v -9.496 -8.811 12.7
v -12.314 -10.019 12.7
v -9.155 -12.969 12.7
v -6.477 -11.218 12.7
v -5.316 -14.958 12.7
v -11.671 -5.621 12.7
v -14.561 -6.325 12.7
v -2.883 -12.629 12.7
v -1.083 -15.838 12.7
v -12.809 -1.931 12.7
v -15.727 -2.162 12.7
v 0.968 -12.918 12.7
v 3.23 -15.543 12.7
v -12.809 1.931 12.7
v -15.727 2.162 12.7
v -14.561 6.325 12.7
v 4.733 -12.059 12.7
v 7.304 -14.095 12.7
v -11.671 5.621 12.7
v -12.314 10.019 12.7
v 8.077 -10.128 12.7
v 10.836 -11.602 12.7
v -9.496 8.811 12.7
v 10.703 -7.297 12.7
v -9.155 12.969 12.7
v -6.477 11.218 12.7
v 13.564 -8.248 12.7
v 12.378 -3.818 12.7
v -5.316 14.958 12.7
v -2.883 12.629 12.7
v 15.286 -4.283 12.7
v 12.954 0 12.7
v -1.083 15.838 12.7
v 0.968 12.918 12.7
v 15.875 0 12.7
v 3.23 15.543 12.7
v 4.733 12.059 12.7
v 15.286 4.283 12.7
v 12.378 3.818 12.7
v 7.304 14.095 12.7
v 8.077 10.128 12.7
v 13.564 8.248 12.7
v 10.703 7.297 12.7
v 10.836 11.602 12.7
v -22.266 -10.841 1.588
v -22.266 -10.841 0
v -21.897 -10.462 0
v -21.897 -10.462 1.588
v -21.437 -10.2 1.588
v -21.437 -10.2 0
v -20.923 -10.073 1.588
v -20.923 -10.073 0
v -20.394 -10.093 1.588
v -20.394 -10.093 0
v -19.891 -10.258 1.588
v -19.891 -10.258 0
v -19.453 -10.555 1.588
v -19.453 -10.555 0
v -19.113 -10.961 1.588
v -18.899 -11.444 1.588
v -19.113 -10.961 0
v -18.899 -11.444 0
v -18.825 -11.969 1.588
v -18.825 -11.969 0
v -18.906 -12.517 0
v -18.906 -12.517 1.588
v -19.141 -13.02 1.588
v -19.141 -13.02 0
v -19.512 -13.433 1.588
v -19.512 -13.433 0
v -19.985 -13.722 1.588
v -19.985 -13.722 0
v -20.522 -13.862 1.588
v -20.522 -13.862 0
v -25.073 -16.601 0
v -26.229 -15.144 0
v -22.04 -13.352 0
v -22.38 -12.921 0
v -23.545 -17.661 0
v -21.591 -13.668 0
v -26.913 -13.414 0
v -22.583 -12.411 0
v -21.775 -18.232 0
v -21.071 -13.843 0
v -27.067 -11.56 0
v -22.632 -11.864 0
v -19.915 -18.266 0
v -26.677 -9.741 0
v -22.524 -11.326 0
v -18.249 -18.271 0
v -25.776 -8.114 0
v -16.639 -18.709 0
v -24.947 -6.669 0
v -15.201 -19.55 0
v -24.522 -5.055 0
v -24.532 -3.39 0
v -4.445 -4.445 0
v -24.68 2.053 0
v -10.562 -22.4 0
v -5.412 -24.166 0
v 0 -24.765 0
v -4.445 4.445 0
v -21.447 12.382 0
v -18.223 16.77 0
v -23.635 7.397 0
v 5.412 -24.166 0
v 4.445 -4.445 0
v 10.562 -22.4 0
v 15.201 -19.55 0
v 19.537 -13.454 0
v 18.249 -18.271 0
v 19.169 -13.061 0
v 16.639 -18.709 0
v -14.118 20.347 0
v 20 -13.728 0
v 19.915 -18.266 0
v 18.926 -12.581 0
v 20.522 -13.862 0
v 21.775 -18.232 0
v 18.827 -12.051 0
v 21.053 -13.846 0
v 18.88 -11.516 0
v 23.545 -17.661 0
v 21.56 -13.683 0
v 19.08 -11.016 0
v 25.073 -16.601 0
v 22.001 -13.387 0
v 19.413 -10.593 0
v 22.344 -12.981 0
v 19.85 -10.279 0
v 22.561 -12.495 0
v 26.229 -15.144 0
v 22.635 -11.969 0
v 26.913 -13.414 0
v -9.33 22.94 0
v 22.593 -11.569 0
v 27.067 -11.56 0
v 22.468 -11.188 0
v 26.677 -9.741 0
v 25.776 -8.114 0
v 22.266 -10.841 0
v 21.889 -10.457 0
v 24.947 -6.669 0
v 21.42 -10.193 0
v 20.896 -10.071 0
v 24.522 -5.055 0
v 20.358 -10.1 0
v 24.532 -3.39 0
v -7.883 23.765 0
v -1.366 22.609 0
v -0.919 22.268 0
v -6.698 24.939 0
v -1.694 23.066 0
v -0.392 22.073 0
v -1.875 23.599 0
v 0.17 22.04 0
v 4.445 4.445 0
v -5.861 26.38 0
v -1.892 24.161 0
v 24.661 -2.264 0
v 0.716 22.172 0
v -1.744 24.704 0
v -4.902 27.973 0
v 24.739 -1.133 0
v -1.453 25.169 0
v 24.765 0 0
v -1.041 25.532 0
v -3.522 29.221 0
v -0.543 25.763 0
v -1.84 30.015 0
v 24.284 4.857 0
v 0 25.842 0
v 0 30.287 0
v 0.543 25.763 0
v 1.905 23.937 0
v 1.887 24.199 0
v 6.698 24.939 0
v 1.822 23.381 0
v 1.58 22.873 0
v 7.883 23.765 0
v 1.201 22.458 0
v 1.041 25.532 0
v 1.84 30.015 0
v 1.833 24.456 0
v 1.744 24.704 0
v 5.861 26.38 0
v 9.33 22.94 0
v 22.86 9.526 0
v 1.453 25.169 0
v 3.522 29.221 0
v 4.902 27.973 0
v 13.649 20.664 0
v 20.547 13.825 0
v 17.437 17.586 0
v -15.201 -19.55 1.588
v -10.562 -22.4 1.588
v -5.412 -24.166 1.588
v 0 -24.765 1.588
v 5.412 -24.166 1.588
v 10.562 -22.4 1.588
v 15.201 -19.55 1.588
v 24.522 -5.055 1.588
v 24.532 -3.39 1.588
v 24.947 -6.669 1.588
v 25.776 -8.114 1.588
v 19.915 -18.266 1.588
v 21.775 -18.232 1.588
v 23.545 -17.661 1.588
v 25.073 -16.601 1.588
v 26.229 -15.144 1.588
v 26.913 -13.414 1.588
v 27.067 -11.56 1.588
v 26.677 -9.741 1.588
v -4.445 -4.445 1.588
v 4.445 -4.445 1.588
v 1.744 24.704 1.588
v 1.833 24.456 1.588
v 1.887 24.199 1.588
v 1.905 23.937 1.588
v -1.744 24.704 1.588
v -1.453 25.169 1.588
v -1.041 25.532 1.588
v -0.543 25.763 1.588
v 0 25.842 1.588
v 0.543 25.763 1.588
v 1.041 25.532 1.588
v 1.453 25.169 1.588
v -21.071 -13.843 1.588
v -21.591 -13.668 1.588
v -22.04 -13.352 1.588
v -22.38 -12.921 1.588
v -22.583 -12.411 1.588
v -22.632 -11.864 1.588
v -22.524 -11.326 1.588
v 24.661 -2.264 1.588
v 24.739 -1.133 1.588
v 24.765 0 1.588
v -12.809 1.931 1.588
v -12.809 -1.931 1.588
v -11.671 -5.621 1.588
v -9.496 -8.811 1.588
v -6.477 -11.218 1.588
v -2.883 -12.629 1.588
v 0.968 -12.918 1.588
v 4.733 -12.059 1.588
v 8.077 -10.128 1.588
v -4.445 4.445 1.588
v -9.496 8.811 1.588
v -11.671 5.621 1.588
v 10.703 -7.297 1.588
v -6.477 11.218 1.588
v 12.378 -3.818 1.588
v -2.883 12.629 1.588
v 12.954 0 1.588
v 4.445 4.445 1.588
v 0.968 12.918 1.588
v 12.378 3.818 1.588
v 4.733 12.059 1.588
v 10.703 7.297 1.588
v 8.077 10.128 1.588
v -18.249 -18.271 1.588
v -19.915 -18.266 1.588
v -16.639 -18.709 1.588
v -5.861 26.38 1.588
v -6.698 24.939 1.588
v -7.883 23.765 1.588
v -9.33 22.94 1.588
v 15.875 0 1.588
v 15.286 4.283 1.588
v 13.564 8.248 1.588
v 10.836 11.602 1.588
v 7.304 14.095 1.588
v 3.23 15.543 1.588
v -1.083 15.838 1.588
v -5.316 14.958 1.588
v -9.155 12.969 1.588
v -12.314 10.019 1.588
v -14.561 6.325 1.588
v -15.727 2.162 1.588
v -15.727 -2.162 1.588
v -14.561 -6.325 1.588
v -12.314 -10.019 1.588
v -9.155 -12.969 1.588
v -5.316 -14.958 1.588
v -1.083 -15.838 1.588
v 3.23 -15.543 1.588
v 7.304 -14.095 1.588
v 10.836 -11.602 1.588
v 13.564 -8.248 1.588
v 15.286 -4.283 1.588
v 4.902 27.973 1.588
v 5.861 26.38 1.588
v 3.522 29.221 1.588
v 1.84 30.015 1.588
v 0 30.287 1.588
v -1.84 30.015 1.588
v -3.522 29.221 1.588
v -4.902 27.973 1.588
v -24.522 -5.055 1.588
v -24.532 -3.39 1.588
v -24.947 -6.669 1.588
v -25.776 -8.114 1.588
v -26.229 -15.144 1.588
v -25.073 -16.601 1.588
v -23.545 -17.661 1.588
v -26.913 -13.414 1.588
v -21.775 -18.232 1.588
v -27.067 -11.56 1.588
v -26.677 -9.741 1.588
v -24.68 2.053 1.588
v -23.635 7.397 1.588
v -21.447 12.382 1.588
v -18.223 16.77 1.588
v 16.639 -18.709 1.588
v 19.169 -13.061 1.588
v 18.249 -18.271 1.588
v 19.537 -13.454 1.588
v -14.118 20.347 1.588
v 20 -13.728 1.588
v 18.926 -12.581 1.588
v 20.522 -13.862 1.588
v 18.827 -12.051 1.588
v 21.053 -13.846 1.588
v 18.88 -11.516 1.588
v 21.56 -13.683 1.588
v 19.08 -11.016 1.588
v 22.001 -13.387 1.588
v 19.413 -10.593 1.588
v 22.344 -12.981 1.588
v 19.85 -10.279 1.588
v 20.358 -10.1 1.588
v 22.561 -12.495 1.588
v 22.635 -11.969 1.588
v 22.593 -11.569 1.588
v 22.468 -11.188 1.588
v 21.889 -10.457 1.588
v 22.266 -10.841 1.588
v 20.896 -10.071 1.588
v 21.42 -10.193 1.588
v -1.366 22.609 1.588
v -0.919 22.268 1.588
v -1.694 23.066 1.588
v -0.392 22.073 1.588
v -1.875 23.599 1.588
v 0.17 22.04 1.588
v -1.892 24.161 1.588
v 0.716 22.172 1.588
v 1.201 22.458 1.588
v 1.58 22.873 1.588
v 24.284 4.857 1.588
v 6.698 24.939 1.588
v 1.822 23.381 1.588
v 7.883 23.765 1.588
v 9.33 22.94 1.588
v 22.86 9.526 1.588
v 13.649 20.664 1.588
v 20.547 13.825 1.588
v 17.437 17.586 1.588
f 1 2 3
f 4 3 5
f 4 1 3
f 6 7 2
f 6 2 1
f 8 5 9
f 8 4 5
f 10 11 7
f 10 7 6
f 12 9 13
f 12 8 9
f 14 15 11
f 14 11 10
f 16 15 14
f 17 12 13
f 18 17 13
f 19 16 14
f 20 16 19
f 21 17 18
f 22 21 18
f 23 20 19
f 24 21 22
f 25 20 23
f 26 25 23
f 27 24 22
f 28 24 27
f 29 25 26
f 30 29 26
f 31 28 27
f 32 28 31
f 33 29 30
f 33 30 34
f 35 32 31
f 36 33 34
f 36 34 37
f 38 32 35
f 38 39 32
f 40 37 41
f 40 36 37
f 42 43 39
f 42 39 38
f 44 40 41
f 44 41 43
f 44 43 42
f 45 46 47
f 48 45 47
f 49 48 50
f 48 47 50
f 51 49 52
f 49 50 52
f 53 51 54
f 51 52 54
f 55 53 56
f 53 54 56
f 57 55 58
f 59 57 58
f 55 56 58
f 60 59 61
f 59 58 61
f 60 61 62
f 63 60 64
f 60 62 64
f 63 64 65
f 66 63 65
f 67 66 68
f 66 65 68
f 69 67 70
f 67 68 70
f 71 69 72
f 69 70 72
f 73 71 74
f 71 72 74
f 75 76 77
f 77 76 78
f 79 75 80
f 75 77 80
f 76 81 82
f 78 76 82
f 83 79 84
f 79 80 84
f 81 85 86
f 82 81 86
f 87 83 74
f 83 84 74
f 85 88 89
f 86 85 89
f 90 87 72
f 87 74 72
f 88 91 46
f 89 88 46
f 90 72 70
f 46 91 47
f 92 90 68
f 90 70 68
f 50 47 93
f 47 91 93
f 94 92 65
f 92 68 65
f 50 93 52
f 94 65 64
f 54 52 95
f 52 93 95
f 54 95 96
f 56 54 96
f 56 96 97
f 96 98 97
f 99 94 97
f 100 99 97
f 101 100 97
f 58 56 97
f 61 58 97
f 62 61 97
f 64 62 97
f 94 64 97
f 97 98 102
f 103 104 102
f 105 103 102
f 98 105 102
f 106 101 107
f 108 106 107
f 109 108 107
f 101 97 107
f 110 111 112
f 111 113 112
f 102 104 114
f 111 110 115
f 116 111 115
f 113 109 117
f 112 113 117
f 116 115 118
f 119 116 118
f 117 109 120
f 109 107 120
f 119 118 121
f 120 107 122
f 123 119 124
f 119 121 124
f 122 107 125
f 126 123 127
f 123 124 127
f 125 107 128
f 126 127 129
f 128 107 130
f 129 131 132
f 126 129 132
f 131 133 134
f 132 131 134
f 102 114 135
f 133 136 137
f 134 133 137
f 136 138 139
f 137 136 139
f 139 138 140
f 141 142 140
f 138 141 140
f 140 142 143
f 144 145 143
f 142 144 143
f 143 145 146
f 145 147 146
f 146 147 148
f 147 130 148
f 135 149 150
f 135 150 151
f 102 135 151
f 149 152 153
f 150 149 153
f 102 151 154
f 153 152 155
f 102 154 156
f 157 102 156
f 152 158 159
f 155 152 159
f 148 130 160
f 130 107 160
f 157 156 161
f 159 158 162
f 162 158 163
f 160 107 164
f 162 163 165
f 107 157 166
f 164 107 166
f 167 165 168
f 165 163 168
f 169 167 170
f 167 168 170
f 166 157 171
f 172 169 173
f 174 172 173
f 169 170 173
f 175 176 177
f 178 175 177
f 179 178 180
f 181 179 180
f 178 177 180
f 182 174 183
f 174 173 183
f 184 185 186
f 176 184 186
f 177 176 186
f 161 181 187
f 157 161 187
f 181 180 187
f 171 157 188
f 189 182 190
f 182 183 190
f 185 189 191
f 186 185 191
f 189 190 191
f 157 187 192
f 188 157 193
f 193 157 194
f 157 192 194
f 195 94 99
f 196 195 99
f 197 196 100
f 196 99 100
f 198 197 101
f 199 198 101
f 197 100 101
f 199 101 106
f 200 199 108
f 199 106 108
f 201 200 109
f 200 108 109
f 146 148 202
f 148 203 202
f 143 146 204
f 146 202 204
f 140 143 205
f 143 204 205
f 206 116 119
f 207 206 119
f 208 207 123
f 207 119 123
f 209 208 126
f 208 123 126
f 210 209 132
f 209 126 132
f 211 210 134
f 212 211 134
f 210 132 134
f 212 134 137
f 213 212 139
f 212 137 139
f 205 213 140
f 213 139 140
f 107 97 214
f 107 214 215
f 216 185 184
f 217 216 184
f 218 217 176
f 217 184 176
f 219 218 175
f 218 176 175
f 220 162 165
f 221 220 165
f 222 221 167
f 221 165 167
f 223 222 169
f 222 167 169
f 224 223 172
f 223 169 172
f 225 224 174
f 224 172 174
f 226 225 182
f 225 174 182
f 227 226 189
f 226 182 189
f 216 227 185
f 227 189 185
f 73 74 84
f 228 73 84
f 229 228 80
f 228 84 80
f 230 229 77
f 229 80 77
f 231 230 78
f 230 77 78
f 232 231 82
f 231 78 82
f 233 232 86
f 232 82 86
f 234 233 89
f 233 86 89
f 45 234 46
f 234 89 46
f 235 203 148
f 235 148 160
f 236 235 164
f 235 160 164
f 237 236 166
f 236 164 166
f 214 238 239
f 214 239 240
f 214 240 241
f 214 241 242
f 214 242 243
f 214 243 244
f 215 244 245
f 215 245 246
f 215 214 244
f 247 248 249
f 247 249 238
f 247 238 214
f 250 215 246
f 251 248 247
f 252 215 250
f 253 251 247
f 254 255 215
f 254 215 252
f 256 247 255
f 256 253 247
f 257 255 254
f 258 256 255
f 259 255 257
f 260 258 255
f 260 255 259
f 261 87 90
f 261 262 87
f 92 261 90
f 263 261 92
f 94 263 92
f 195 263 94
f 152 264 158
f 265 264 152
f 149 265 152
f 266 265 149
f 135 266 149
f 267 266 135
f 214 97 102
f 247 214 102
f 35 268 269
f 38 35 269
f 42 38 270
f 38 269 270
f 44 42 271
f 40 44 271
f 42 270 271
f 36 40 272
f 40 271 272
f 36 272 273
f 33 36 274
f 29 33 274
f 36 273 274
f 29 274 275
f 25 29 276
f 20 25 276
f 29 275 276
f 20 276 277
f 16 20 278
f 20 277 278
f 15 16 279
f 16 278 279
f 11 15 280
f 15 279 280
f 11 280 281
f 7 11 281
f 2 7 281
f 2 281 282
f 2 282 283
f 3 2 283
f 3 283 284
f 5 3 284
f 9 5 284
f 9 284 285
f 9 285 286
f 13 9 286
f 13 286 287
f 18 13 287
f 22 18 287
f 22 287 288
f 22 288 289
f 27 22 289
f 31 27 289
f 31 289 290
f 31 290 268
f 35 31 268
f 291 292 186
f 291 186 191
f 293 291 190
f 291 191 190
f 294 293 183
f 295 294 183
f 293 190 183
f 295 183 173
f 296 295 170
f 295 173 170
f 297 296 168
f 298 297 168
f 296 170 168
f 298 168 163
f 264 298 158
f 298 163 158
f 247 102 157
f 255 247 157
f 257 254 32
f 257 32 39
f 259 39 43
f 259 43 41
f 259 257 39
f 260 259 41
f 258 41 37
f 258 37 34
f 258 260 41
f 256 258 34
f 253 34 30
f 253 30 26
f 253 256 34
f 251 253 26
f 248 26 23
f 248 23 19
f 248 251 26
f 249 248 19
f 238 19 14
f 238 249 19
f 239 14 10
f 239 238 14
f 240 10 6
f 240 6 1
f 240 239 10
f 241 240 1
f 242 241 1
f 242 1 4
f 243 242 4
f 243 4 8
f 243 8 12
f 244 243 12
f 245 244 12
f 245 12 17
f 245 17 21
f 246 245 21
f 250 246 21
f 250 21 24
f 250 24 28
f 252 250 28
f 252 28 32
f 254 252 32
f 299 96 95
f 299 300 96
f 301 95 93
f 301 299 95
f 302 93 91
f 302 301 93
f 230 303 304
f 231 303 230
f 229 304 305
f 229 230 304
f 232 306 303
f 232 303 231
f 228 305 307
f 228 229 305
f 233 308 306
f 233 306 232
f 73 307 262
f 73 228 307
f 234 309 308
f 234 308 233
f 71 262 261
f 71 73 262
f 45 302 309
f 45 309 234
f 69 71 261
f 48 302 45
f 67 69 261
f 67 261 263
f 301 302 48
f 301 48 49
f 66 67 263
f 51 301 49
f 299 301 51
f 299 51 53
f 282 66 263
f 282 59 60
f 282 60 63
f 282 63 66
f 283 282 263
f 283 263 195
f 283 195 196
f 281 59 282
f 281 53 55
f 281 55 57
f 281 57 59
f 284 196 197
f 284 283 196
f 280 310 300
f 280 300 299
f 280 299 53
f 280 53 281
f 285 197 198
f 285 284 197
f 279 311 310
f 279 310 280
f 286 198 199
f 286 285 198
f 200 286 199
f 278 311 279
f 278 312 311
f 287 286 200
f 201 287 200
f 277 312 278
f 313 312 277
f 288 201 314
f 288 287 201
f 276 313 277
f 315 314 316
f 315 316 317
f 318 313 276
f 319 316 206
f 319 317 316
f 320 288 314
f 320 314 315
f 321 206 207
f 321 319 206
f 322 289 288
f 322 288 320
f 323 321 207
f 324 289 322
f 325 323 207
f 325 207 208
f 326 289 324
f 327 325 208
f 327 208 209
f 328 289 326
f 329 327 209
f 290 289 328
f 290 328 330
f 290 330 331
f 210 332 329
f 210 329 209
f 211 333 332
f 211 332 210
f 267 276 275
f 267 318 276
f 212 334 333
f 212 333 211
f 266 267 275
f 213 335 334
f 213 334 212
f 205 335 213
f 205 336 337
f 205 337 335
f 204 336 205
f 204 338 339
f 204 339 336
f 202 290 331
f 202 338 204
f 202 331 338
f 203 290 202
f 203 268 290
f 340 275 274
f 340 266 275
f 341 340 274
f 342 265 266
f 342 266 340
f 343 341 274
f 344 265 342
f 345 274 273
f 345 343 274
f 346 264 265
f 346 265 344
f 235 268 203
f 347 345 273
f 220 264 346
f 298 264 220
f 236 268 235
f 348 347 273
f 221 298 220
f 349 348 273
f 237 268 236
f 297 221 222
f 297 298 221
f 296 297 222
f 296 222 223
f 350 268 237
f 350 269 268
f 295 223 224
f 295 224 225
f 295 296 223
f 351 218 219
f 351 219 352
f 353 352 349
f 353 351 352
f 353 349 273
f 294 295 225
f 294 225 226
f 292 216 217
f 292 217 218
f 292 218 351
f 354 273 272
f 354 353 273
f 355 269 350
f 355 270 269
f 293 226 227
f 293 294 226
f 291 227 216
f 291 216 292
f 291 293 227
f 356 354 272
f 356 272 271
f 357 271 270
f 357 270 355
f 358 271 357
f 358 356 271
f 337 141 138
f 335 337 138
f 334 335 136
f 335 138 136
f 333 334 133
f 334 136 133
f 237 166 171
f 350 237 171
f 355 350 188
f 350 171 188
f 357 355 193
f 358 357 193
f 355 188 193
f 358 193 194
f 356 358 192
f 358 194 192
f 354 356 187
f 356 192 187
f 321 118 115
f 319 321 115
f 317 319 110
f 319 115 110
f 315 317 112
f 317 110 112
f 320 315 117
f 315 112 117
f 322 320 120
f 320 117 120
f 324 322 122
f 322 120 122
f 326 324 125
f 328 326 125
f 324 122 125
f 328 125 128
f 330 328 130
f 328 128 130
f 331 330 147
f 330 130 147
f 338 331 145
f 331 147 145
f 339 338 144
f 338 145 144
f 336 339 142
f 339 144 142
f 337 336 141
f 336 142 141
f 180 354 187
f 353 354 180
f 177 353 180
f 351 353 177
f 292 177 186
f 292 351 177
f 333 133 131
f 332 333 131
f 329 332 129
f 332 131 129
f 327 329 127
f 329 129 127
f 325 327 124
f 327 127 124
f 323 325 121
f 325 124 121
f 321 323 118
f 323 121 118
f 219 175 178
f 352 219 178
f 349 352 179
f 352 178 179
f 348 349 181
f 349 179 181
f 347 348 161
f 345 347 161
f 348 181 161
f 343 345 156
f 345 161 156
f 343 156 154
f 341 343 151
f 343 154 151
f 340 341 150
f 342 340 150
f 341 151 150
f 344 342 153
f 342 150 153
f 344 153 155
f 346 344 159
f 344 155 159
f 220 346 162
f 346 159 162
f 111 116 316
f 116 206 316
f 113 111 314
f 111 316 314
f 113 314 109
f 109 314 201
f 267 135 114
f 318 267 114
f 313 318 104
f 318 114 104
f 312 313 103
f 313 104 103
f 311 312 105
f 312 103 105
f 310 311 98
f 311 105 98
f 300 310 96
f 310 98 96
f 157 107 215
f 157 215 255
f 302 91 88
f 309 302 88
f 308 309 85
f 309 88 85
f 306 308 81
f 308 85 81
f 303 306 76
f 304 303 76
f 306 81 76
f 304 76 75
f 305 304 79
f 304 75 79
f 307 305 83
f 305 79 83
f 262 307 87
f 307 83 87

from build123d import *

# Parameters (mm, degrees)
F0_R     = 15.875
F0_R_2   = 12.954
F1_DEPTH = 12.7
F0_W     = 8.89
F0_H     = 8.89
F2_DEPTH = 1.5875
F3_DEPTH = 1.5875
F4_R     = 6.35


with BuildPart() as f1:
    # F0 (on Top) → F1 (new body)
    with BuildSketch(Plane.XY):
        Circle(F0_R)
        Circle(F0_R_2, mode=Mode.SUBTRACT)
    extrude(amount=F1_DEPTH)

    # F0 (on Top) → F2 (join)
    with BuildSketch(Plane.XY):
        Circle(F0_R_2)
        Rectangle(F0_W, F0_H, mode=Mode.SUBTRACT)
    extrude(amount=F2_DEPTH)

    # F0 (on Top) → F3 (join)
    with BuildSketch(Plane.XY):
        with BuildLine():
            ThreePointArc((23.9050999455, -6.4692674698), (24.5490837421, -3.2630832697), (24.765, 0))
            ThreePointArc((24.765, 0), (19.6285885254, 15.1004548773), (6.35, 23.9370575677))
            ThreePointArc((6.35, 23.9370575677), (4.0651088886, 24.4290833787), (1.7440091422, 24.703515076))
            ThreePointArc((1.7440091422, 24.703515076), (1.8643178935, 24.3286489263), (1.905, 23.9370575677))
            ThreePointArc((1.905, 23.9370575677), (-0.3915913586, 22.0727396742), (-1.7440091422, 24.703515076))
            ThreePointArc((-1.7440091422, 24.703515076), (-4.0651088886, 24.4290833787), (-6.35, 23.9370575677))
            ThreePointArc((-6.35, 23.9370575677), (-21.4471191247, 12.3825), (-23.9050999455, -6.4692674698))
            ThreePointArc((-23.9050999455, -6.4692674698), (-23.1887612414, -8.6940541227), (-22.2658761897, -10.8414013165))
            ThreePointArc((-22.2658761897, -10.8414013165), (-20.1370690632, -10.1581864481), (-18.8250999455, -11.9685287839))
            ThreePointArc((-18.8250999455, -11.9685287839), (-19.3113489683, -13.239815795), (-20.5218670475, -13.8621137596))
            ThreePointArc((-20.5218670475, -13.8621137596), (-19.1236523528, -15.735029256), (-17.5550999455, -17.4677900979))
            ThreePointArc((-17.5550999455, -17.4677900979), (0, -24.765), (17.5550999455, -17.4677900979))
            ThreePointArc((17.5550999455, -17.4677900979), (19.1236523528, -15.735029256), (20.5218670475, -13.8621137596))
            ThreePointArc((20.5218670475, -13.8621137596), (19.0803215513, -11.0160287839), (22.2658761897, -10.8414013165))
            ThreePointArc((22.2658761897, -10.8414013165), (23.1887612414, -8.6940541227), (23.9050999455, -6.4692674698))
        make_face()
        Circle(F0_R, mode=Mode.SUBTRACT)
        with BuildLine():
            ThreePointArc((1.7440091422, 24.703515076), (4.0651088886, 24.4290833787), (6.35, 23.9370575677))
            ThreePointArc((6.35, 23.9370575677), (0, 30.2870575677), (-6.35, 23.9370575677))
            ThreePointArc((-6.35, 23.9370575677), (-4.0651088886, 24.4290833787), (-1.7440091422, 24.703515076))
            ThreePointArc((-1.7440091422, 24.703515076), (0, 25.8420575677), (1.7440091422, 24.703515076))
        make_face()
        with BuildLine():
            ThreePointArc((17.5550999455, -17.4677900979), (26.2293612595, -15.1435287839), (23.9050999455, -6.4692674698))
            ThreePointArc((23.9050999455, -6.4692674698), (23.1887612414, -8.6940541227), (22.2658761897, -10.8414013165))
            ThreePointArc((22.2658761897, -10.8414013165), (22.5404422812, -11.3754979015), (22.6350999455, -11.9685287839))
            ThreePointArc((22.6350999455, -11.9685287839), (22.0013869566, -13.3872797611), (20.5218670475, -13.8621137596))
            ThreePointArc((20.5218670475, -13.8621137596), (19.1236523528, -15.735029256), (17.5550999455, -17.4677900979))
        make_face()
        with BuildLine():
            ThreePointArc((-22.2658761897, -10.8414013165), (-23.1887612414, -8.6940541227), (-23.9050999455, -6.4692674698))
            ThreePointArc((-23.9050999455, -6.4692674698), (-26.2293612595, -15.1435287839), (-17.5550999455, -17.4677900979))
            ThreePointArc((-17.5550999455, -17.4677900979), (-19.1236523528, -15.735029256), (-20.5218670475, -13.8621137596))
            ThreePointArc((-20.5218670475, -13.8621137596), (-22.3798783397, -12.9210287839), (-22.2658761897, -10.8414013165))
        make_face()
    extrude(amount=F3_DEPTH)

    # F4
    f4_edges = [f1.edges().sort_by_distance(p)[0] for p in [
        (-23.9051, -6.469267, 0.79375),
        (17.5551, -17.46779, 0.79375),
        (6.35, 23.937058, 0.79375),
        (23.9051, -6.469267, 0.79375),
        (-6.35, 23.937058, 0.79375),
        (-17.5551, -17.46779, 0.79375),
    ]]
    fillet(f4_edges, radius=F4_R)


solid = f1.part
